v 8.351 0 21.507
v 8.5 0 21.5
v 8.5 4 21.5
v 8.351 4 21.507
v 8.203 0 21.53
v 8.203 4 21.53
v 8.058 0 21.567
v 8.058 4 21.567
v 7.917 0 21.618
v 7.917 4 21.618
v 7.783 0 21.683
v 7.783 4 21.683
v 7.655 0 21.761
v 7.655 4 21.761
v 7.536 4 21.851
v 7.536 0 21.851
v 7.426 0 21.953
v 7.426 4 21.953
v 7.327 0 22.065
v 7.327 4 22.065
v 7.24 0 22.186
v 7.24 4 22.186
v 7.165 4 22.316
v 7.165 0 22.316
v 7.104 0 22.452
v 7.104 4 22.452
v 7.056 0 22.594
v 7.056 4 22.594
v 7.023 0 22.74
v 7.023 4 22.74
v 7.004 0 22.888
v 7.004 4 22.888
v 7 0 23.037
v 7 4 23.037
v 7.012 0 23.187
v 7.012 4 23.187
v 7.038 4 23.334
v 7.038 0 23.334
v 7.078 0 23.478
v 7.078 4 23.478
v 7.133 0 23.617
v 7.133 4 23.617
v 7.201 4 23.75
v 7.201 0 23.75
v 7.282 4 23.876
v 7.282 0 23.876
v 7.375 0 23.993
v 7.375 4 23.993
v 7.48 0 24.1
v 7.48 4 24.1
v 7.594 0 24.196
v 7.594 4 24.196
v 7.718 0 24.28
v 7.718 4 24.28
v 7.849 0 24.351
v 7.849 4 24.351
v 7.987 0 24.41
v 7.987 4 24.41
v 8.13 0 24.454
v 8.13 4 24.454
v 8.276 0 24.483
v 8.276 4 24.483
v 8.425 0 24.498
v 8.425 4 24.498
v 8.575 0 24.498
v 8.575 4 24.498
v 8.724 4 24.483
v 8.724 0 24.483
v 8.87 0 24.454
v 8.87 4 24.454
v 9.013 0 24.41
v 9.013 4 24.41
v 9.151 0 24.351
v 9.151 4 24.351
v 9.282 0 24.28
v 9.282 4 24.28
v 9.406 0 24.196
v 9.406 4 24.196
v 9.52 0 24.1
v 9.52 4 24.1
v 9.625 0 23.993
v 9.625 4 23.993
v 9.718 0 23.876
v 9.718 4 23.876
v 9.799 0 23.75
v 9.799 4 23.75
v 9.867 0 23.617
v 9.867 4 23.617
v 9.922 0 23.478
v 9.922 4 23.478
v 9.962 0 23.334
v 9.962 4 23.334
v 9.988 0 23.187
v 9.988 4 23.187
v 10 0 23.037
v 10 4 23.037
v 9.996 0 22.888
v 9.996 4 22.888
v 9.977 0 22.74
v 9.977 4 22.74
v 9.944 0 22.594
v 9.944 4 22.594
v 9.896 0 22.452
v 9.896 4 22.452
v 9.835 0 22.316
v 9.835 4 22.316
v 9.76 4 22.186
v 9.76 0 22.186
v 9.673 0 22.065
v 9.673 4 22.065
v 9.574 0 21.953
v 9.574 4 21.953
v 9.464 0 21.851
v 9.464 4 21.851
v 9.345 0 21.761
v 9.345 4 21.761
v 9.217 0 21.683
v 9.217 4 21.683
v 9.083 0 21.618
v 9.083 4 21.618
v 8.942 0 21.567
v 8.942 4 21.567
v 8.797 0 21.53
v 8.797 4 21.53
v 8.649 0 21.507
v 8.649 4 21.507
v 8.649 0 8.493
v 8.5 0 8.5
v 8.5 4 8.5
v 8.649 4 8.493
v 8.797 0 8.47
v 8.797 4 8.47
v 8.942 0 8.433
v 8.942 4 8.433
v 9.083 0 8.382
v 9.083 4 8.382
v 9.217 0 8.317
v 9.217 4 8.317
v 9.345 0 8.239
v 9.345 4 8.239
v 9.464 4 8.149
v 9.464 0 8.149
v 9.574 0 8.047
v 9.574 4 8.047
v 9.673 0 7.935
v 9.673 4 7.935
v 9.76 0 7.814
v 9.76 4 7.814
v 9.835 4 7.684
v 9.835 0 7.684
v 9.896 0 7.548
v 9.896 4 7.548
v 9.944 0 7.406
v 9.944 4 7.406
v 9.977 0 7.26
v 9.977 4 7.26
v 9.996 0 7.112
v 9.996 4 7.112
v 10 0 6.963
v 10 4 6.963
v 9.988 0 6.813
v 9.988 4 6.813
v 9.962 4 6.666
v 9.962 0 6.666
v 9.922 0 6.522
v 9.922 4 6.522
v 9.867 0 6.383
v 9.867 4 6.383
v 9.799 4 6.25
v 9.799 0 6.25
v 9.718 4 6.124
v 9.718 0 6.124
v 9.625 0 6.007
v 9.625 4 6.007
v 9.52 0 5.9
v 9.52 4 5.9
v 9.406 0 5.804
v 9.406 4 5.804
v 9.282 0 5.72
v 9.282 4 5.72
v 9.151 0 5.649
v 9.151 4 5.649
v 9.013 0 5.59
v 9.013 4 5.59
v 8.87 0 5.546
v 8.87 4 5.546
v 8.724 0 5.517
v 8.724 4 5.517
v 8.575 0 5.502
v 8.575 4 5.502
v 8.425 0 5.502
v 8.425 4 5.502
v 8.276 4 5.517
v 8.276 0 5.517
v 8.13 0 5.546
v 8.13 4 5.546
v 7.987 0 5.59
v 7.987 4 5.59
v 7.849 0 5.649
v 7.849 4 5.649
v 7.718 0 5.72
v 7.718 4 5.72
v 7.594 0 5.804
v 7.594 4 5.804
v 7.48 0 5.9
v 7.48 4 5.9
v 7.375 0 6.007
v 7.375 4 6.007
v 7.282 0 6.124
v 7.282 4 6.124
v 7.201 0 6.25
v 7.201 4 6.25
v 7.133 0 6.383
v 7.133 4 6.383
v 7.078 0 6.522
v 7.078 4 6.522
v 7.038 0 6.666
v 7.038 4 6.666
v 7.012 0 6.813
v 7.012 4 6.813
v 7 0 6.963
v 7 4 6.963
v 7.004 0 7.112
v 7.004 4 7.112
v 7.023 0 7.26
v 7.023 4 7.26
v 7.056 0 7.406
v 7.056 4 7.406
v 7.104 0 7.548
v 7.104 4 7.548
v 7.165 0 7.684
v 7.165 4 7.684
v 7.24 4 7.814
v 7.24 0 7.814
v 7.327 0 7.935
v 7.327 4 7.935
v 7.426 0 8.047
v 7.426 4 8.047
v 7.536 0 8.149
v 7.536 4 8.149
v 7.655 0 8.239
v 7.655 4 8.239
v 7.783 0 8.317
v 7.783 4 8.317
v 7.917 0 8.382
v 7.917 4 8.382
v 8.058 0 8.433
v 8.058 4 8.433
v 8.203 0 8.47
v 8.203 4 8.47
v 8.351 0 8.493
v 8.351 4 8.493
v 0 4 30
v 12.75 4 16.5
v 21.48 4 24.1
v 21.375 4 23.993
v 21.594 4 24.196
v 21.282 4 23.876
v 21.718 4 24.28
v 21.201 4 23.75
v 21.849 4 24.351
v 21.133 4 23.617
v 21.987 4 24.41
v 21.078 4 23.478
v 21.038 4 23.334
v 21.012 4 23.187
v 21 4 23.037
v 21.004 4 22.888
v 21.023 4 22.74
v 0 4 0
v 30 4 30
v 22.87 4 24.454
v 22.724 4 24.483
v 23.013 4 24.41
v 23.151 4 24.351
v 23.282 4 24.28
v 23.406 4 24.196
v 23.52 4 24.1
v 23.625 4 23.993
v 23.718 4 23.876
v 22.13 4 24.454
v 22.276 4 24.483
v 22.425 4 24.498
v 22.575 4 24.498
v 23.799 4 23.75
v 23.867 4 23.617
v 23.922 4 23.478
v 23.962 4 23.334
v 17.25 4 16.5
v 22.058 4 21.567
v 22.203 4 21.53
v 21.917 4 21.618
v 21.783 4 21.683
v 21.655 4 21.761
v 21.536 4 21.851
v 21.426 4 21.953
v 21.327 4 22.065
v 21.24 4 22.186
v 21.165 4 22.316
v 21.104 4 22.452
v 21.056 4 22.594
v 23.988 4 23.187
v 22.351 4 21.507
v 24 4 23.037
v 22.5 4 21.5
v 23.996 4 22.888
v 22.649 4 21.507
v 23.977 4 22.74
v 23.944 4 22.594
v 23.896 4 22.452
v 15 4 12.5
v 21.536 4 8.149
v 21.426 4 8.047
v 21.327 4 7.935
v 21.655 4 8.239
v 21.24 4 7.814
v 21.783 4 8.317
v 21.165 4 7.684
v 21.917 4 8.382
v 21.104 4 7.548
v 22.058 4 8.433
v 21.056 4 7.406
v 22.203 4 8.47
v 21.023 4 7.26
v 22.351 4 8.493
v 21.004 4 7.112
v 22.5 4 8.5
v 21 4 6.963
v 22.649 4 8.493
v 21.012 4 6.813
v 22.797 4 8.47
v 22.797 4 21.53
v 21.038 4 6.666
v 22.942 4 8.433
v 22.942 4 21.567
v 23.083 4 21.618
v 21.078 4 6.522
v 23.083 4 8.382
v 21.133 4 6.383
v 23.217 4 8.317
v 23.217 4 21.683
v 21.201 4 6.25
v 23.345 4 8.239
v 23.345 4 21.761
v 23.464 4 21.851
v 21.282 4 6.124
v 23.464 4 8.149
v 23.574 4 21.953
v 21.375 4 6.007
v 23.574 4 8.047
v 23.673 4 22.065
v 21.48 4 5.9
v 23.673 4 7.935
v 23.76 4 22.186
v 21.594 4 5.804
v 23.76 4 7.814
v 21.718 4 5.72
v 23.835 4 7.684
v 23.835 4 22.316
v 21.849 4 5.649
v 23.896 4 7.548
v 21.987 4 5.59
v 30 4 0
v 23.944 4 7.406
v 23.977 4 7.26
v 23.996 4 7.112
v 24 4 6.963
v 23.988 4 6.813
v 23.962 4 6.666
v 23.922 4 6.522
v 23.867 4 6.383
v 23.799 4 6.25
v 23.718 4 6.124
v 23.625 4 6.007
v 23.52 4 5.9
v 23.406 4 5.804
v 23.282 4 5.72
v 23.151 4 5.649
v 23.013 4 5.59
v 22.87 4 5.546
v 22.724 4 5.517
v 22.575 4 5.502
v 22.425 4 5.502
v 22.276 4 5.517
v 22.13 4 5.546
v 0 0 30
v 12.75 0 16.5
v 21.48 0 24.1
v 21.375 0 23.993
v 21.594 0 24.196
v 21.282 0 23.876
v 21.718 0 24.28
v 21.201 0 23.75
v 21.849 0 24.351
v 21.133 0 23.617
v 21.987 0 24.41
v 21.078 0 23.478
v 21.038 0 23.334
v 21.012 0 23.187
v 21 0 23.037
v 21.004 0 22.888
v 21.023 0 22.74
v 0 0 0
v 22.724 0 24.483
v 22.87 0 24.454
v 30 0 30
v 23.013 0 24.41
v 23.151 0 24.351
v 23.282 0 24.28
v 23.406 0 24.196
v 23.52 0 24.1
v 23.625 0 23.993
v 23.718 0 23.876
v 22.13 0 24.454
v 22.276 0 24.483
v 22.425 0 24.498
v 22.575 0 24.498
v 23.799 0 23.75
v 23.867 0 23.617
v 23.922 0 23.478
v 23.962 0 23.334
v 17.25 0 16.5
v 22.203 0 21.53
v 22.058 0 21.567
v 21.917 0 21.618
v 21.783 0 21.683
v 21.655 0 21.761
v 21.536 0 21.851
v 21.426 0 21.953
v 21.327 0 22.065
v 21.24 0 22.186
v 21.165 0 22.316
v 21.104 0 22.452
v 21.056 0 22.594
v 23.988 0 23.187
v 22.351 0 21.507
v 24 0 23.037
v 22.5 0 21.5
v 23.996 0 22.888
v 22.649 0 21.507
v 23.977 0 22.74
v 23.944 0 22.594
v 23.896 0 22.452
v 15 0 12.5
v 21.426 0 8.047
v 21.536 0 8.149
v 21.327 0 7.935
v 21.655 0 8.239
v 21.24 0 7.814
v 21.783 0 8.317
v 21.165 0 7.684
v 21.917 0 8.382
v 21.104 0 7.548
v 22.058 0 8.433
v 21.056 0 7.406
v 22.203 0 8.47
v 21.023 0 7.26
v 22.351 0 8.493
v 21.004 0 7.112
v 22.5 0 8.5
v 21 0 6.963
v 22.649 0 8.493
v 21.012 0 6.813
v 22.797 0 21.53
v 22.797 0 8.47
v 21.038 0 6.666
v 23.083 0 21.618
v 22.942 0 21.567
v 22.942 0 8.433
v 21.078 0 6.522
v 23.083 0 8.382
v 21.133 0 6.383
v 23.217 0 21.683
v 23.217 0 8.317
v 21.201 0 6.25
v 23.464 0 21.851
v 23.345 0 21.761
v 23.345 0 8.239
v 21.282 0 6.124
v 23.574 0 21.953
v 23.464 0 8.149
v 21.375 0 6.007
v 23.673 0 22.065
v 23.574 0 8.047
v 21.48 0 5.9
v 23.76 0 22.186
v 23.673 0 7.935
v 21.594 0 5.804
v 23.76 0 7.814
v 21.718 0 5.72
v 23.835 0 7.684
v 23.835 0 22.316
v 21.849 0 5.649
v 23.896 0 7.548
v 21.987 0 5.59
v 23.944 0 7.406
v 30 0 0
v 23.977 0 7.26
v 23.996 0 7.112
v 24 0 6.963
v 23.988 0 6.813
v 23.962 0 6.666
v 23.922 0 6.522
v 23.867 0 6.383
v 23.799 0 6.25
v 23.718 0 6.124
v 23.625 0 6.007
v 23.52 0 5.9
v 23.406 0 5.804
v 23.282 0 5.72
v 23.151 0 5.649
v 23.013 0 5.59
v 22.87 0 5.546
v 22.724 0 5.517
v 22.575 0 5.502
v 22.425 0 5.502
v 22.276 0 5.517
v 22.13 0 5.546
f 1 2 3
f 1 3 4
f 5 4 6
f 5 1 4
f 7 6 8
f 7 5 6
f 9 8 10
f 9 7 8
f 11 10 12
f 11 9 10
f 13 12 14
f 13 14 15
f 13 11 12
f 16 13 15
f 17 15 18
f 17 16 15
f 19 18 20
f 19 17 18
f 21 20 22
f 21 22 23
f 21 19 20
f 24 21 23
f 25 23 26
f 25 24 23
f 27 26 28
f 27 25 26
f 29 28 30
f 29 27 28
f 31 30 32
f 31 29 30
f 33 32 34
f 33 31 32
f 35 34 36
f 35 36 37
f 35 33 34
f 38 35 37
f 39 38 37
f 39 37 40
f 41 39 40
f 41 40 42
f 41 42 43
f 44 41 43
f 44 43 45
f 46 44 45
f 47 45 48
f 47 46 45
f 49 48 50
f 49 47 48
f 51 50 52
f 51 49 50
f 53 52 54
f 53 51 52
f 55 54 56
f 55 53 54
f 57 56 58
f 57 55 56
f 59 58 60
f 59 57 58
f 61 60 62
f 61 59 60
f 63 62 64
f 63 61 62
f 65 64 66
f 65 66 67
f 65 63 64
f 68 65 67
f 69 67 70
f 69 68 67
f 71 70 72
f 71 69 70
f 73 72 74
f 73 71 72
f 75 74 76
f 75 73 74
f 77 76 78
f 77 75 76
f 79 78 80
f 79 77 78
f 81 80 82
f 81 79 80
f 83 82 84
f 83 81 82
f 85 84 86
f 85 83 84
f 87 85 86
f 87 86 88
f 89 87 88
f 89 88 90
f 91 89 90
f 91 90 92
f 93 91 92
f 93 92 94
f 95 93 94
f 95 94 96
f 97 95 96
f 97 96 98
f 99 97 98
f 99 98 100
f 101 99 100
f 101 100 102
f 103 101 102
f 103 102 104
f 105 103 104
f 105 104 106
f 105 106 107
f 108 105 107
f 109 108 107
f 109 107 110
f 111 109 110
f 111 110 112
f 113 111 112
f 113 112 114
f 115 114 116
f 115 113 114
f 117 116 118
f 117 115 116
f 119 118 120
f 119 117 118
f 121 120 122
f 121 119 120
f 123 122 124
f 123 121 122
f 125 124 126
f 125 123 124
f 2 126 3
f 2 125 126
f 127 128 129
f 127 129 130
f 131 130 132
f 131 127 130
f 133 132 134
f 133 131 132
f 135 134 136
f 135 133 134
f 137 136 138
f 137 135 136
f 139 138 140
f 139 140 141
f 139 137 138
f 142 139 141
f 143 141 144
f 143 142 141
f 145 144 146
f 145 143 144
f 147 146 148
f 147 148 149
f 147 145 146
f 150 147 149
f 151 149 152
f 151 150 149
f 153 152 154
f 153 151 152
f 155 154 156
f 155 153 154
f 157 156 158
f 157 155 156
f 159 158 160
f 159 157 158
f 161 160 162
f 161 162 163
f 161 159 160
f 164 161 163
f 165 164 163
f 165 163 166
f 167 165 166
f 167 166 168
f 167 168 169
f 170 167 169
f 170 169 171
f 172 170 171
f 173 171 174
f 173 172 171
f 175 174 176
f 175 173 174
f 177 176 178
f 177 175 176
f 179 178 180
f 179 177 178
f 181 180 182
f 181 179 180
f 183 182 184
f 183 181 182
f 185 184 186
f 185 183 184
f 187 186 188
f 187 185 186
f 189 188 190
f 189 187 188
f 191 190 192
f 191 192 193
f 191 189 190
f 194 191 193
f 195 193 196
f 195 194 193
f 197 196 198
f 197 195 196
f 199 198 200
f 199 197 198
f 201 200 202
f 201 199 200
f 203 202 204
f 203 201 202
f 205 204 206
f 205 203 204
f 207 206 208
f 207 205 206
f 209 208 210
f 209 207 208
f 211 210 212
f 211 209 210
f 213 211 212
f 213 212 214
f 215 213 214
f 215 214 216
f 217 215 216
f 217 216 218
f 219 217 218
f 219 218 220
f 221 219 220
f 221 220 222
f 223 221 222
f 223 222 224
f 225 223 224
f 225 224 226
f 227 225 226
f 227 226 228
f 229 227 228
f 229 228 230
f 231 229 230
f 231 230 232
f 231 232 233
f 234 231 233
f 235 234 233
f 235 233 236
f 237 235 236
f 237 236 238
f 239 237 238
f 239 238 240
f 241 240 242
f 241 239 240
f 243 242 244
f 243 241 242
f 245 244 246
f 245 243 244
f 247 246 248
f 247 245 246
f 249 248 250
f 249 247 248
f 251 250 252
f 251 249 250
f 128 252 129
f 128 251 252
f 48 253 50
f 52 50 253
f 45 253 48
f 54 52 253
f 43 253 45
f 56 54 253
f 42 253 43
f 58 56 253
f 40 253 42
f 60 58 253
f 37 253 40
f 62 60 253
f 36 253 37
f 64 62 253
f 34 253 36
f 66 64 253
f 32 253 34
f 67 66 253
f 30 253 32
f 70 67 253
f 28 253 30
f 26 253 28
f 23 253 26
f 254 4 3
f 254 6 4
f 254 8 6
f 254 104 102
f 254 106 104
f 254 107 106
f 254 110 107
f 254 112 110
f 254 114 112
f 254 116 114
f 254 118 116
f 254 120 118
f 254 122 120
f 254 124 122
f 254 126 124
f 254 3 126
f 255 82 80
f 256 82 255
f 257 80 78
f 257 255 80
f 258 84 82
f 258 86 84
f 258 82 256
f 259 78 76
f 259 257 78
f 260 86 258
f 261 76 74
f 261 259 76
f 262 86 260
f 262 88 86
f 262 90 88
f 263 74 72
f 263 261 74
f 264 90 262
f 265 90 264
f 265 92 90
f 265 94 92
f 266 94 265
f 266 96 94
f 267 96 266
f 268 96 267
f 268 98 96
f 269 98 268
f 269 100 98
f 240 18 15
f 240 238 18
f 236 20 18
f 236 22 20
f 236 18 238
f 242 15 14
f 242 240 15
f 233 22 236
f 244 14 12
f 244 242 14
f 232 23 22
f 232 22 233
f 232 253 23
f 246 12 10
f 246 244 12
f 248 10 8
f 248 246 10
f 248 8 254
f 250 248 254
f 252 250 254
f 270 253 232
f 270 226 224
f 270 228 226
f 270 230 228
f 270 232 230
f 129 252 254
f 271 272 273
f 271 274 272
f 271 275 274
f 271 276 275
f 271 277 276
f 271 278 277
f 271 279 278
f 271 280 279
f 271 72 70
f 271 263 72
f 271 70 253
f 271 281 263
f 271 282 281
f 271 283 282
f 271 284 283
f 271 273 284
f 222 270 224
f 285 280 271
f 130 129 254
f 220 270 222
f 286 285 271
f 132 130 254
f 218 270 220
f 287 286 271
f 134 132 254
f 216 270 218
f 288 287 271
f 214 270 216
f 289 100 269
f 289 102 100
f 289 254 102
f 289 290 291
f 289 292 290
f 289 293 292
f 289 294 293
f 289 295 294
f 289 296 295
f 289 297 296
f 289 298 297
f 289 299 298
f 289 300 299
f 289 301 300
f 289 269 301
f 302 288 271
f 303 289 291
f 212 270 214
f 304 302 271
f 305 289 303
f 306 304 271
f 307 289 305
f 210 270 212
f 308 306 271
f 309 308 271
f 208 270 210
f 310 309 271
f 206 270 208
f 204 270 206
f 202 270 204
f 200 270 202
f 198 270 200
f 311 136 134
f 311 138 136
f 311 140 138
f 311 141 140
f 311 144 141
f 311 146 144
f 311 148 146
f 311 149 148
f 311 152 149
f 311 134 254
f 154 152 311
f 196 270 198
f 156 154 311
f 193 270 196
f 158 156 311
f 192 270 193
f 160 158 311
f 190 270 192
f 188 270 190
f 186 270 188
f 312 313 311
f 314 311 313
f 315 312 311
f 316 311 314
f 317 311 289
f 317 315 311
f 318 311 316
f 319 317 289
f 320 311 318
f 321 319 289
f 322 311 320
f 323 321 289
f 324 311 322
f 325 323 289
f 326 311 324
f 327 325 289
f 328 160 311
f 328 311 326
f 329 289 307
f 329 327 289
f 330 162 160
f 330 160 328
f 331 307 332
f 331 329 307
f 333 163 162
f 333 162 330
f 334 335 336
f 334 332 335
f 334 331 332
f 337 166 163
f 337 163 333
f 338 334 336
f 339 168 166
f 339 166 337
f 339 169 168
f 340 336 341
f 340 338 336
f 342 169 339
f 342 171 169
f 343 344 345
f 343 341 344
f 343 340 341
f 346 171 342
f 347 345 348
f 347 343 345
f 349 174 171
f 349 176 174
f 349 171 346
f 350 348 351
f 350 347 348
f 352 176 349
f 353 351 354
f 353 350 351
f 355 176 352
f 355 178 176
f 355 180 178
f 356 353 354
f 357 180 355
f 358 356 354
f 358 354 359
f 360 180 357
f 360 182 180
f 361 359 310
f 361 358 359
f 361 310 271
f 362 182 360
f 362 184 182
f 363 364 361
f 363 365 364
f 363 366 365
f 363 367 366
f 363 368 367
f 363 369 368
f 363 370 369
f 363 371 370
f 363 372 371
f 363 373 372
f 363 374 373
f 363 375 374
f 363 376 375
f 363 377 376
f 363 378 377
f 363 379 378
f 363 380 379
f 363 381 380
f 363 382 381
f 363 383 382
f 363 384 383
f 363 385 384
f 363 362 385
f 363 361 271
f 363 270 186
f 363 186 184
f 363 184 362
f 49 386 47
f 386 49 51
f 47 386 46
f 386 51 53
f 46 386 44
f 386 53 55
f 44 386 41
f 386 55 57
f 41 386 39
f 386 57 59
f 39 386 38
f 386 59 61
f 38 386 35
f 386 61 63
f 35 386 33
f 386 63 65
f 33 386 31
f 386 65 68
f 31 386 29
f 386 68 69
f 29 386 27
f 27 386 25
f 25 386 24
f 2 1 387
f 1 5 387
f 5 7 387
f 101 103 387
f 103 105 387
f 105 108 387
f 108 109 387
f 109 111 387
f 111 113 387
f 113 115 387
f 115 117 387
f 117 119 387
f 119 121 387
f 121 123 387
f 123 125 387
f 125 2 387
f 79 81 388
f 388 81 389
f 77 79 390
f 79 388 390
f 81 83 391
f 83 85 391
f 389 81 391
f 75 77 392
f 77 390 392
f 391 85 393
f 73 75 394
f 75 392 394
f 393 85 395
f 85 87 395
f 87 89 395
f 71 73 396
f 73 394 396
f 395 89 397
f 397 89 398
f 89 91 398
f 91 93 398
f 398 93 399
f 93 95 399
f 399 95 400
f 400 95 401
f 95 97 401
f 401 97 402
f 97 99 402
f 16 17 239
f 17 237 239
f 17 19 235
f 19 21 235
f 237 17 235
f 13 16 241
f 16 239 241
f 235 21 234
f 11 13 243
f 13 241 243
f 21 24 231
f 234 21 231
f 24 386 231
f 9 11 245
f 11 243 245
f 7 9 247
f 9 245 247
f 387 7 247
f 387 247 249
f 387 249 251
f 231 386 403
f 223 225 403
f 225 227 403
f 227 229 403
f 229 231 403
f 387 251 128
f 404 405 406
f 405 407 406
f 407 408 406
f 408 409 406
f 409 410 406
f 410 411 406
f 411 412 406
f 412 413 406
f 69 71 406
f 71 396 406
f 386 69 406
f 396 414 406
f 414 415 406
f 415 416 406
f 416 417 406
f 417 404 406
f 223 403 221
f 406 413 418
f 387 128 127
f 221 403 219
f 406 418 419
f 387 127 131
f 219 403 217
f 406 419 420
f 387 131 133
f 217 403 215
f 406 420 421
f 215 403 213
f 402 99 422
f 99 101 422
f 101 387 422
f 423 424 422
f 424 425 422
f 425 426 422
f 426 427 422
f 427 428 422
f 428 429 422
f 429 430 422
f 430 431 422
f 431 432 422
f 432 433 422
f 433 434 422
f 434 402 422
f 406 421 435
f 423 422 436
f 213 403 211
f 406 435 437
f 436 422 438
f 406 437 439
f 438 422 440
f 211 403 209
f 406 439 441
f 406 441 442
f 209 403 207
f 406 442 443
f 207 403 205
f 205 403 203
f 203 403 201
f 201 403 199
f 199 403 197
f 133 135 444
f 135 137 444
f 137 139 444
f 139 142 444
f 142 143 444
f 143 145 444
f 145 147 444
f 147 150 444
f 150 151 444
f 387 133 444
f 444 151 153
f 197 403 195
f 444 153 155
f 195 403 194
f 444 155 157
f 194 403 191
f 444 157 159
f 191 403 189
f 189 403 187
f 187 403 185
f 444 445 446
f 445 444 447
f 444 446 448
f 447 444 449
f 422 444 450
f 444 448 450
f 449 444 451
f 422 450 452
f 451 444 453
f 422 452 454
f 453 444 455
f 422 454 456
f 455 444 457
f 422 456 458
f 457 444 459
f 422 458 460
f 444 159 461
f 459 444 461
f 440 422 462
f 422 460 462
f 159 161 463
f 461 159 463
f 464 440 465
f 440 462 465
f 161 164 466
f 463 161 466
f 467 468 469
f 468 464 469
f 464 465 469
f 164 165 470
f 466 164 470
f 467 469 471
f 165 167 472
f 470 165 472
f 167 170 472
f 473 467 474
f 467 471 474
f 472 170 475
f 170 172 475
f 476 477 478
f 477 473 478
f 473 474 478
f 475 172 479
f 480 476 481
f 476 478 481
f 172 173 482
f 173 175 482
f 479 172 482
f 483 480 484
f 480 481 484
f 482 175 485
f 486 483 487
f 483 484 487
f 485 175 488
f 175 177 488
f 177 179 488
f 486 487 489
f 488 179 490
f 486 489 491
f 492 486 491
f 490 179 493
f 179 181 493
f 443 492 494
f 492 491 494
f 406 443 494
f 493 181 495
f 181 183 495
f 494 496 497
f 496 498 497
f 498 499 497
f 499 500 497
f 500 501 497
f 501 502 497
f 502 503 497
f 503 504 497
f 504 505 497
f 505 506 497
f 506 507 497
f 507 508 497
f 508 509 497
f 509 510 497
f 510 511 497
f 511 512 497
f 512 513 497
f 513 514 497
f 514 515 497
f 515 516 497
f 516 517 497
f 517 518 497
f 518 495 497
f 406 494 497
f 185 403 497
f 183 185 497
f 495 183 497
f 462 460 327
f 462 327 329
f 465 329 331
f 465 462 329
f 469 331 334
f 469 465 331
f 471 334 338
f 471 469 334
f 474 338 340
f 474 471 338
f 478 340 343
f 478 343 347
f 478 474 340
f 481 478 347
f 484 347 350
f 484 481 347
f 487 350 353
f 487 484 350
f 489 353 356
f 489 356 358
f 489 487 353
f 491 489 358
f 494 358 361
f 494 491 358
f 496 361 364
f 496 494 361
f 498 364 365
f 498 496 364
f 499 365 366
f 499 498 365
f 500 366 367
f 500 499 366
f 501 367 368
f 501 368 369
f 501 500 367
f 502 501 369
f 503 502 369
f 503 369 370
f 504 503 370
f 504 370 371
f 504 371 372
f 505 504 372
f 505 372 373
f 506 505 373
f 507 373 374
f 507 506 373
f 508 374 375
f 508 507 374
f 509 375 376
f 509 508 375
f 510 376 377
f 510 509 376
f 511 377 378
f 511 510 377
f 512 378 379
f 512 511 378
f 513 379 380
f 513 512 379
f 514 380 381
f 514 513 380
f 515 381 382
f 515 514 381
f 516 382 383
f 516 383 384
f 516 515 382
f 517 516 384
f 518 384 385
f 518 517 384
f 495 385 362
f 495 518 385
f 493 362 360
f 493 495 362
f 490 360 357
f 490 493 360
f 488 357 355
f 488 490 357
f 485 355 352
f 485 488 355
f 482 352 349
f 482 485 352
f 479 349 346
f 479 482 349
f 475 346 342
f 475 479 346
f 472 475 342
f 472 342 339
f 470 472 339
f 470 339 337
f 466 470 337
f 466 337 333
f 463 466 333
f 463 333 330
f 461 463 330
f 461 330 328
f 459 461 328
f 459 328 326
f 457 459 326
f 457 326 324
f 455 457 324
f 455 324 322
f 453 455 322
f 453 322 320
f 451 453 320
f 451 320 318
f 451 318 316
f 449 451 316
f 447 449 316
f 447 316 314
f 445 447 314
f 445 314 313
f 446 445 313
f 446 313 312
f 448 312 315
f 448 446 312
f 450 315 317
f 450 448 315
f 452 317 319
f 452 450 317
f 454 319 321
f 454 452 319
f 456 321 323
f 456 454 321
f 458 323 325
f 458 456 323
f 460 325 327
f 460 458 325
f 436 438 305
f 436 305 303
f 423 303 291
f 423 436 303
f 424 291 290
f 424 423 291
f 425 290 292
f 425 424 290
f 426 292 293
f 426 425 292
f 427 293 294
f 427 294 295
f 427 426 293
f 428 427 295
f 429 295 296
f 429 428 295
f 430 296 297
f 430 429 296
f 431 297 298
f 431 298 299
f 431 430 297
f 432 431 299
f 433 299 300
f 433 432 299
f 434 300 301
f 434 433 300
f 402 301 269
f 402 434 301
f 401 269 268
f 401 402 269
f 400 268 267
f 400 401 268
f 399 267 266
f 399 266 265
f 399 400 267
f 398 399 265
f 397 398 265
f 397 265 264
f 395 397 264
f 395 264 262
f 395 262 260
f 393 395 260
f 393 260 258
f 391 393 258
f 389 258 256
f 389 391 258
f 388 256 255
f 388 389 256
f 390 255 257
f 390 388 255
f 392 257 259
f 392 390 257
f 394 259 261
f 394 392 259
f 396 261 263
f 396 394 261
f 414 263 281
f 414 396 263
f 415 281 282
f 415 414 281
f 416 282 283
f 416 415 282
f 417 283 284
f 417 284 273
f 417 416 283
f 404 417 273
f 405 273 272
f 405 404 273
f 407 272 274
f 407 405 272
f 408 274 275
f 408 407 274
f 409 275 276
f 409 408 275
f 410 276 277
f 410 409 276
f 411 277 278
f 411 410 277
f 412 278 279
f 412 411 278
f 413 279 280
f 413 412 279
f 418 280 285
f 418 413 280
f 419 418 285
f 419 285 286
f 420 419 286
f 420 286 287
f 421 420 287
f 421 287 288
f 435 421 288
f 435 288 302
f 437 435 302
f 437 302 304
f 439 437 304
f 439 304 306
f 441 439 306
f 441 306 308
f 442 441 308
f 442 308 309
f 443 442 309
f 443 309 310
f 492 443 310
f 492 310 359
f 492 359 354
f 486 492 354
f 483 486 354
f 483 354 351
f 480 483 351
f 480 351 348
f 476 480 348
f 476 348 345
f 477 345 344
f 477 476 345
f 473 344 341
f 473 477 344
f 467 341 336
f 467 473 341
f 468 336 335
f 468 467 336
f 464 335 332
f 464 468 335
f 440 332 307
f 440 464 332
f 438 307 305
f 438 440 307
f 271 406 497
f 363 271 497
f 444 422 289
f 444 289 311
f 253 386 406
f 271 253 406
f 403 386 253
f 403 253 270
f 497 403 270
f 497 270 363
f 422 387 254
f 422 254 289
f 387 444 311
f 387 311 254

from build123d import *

# Parameters (mm, degrees)
SKETCH_1_W      = 30
SKETCH_1_H      = 30
SKETCH_1_R      = 1.5
EXTRUDE_1_DEPTH = 4


with BuildPart() as part:
    # 草图1 → 凸台-拉伸1 (new body)
    with BuildSketch(Plane(origin=(0, 0, 0), x_dir=(1, 0, 0), z_dir=(0, 1, 0))):
        with Locations((15, -15)):
            Rectangle(SKETCH_1_W, SKETCH_1_H)
        with Locations(Location((8.5, -7, 0), (0, 0, 270))):
            Circle(SKETCH_1_R, mode=Mode.SUBTRACT)
        with Locations(Location((22.5, -7, 0), (0, 0, 270))):
            Circle(SKETCH_1_R, mode=Mode.SUBTRACT)
        with Locations(Location((22.5, -23, 0), (0, 0, 90))):
            Circle(SKETCH_1_R, mode=Mode.SUBTRACT)
        with Locations(Location((8.5, -23, 0), (0, 0, 90))):
            Circle(SKETCH_1_R, mode=Mode.SUBTRACT)
        Polygon((15, -12.5), (12.75, -16.5), (17.25, -16.5), align=None, mode=Mode.SUBTRACT)
    extrude(amount=EXTRUDE_1_DEPTH)


solid = part.part
